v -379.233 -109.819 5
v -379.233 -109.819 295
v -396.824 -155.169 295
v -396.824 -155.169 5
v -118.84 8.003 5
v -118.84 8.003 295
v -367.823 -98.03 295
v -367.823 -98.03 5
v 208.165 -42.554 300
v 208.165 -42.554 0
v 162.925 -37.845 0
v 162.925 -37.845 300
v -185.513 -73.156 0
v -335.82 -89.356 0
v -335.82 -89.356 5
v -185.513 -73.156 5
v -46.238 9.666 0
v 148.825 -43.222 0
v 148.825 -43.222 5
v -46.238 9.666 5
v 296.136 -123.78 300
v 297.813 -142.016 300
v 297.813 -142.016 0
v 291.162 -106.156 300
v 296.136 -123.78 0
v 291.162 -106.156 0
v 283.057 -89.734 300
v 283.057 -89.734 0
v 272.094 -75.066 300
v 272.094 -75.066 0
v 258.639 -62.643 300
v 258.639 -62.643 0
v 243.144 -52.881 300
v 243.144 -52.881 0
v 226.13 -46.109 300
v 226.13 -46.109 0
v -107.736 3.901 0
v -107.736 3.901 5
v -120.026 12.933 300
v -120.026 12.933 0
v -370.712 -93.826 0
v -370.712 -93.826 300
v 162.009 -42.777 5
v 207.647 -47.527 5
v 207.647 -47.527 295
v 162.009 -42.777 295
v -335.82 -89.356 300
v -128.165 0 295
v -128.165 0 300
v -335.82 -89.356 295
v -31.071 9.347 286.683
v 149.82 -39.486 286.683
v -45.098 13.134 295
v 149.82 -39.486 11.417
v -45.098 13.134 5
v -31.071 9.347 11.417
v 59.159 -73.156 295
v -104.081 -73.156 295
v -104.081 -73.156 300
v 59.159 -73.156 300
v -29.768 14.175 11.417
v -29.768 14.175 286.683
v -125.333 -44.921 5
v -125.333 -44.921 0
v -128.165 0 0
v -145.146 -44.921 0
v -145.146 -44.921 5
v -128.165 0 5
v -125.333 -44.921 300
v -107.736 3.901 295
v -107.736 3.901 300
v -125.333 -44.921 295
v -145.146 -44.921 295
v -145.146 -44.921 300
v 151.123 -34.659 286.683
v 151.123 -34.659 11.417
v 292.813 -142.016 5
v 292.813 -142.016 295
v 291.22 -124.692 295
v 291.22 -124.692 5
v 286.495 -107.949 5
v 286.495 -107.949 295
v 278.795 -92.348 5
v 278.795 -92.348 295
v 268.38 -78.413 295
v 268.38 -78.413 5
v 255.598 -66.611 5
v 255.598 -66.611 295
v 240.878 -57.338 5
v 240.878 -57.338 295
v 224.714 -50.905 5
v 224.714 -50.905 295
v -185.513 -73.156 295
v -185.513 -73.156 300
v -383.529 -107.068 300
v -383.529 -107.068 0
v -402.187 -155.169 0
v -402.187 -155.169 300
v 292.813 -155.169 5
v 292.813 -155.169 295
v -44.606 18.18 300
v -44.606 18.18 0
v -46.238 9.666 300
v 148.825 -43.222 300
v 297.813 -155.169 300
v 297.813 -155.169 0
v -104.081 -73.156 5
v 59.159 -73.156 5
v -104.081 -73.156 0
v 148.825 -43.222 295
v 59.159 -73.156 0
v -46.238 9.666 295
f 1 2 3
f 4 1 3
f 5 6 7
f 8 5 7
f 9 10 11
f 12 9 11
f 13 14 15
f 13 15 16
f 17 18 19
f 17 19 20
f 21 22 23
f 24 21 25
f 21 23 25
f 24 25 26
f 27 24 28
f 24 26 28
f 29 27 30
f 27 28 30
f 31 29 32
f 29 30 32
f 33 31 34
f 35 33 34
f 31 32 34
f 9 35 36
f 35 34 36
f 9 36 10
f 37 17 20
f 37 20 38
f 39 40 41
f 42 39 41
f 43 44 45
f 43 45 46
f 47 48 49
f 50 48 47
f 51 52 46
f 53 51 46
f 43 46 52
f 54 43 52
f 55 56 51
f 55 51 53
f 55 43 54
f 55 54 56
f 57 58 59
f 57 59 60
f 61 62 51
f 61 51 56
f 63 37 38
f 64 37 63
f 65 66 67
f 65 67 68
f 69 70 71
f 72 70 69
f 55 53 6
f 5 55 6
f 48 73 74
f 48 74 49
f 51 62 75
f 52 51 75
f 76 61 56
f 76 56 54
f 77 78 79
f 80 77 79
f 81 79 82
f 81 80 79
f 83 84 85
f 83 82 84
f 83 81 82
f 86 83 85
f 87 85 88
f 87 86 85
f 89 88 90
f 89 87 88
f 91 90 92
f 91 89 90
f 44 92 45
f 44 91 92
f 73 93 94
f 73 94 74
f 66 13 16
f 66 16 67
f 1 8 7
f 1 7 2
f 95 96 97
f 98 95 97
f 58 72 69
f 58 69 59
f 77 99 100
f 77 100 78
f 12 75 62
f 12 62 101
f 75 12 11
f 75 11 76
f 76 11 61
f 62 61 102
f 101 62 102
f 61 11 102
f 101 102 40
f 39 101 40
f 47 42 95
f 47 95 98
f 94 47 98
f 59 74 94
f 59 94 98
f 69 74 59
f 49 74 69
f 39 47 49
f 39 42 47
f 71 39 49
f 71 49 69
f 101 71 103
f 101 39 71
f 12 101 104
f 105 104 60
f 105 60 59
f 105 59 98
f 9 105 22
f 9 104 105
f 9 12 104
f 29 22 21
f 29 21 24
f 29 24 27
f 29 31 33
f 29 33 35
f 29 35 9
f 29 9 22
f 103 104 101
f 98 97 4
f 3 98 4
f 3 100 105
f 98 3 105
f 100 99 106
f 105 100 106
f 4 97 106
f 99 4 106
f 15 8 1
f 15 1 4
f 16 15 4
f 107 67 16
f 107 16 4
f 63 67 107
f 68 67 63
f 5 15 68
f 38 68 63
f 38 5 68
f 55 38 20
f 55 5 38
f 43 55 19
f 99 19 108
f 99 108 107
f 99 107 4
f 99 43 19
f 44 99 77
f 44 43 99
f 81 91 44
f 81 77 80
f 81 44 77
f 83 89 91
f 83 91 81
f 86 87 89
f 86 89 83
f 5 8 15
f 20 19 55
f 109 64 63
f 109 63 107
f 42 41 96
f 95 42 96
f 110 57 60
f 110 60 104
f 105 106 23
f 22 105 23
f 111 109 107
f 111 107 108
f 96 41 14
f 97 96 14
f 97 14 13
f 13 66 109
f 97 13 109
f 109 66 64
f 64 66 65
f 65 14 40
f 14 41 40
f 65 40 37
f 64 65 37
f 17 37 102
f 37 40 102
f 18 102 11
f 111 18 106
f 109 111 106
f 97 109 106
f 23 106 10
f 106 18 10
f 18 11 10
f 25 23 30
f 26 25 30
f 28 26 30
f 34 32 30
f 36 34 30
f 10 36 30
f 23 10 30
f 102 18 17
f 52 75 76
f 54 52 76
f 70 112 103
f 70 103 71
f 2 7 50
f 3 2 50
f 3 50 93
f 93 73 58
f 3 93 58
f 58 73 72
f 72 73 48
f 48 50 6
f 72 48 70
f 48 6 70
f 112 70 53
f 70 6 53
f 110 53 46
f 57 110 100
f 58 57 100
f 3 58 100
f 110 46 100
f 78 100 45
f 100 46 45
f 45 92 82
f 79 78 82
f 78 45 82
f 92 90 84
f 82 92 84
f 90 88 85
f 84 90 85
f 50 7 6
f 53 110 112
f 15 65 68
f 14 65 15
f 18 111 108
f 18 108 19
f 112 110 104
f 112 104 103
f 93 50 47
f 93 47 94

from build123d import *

# Parameters (mm, degrees)
EXTRUDE_1_DEPTH     = 300
SHELL_2_T           = -5
CUT_EXTRUDE_1_DEPTH = 300
SKETCH_4_W          = 187.367155343
SKETCH_4_H          = 275.26588877
CUT_EXTRUDE_2_DEPTH = 10


with BuildPart() as part:
    # 草图1 → 凸台-拉伸1 (new body)
    with BuildSketch(Plane.XY):
        with BuildLine():
            Line((-402.186878728, -155.168986083), (297.813121272, -155.168986083))
            Line((297.813121272, -155.168986083), (297.813121272, -142.016461596))
            ThreePointArc((297.813121272, -142.016461596), (272.093642568, -75.065702407), (208.165038153, -42.553715721))
            Line((208.165038153, -42.553715721), (162.925157805, -37.845224347))
            Line((162.925157805, -37.845224347), (-44.606277086, 18.180372145))
            Line((-44.606277086, 18.180372145), (-120.025544077, 12.932974824))
            Line((-120.025544077, 12.932974824), (-370.712436241, -93.826427202))
            Line((-370.712436241, -93.826427202), (-383.529193777, -107.067800556))
            Line((-383.529193777, -107.067800556), (-402.186878728, -155.168986083))
        make_face()
    extrude(amount=EXTRUDE_1_DEPTH)

    # 抽壳2
    shell_2_openings = [part.faces().sort_by_distance(p)[0] for p in [
        (-52.186878728, -155.168986083, 150),
    ]]
    offset(amount=SHELL_2_T, openings=shell_2_openings, kind=Kind.INTERSECTION)

    # 草图3 → 切除-拉伸1 (cut)
    with BuildSketch(Plane(origin=(0, 0, 0), x_dir=(-1, 0, 0), z_dir=(0, 0, -1))):
        Polygon((145.146298651, -44.9212837), (128.165102127, 0), (335.819907539, -89.355551576), (185.513355718, -73.15629574), align=None)
        Polygon((107.735938101, 3.900733264), (125.333088077, -44.9212837), (104.080540111, -73.15629574), (-59.15944036, -73.15629574), (-148.825386801, -43.221714567), (46.237805698, 9.665692949), align=None)
    extrude(amount=-CUT_EXTRUDE_1_DEPTH, mode=Mode.SUBTRACT)

    # 草图4 → 切除-拉伸2 (cut)
    with BuildSketch(Plane(origin=(1.544560656, 5.721400739, 0), x_dir=(0.9654383198530997, -0.26063163767897407, 0), z_dir=(0.26063163767897407, 0.9654383198530997, 0))):
        with Locations((61.249747997, -149.050418092)):
            Rectangle(SKETCH_4_W, SKETCH_4_H)
    extrude(amount=-CUT_EXTRUDE_2_DEPTH, mode=Mode.SUBTRACT)


solid = part.part
